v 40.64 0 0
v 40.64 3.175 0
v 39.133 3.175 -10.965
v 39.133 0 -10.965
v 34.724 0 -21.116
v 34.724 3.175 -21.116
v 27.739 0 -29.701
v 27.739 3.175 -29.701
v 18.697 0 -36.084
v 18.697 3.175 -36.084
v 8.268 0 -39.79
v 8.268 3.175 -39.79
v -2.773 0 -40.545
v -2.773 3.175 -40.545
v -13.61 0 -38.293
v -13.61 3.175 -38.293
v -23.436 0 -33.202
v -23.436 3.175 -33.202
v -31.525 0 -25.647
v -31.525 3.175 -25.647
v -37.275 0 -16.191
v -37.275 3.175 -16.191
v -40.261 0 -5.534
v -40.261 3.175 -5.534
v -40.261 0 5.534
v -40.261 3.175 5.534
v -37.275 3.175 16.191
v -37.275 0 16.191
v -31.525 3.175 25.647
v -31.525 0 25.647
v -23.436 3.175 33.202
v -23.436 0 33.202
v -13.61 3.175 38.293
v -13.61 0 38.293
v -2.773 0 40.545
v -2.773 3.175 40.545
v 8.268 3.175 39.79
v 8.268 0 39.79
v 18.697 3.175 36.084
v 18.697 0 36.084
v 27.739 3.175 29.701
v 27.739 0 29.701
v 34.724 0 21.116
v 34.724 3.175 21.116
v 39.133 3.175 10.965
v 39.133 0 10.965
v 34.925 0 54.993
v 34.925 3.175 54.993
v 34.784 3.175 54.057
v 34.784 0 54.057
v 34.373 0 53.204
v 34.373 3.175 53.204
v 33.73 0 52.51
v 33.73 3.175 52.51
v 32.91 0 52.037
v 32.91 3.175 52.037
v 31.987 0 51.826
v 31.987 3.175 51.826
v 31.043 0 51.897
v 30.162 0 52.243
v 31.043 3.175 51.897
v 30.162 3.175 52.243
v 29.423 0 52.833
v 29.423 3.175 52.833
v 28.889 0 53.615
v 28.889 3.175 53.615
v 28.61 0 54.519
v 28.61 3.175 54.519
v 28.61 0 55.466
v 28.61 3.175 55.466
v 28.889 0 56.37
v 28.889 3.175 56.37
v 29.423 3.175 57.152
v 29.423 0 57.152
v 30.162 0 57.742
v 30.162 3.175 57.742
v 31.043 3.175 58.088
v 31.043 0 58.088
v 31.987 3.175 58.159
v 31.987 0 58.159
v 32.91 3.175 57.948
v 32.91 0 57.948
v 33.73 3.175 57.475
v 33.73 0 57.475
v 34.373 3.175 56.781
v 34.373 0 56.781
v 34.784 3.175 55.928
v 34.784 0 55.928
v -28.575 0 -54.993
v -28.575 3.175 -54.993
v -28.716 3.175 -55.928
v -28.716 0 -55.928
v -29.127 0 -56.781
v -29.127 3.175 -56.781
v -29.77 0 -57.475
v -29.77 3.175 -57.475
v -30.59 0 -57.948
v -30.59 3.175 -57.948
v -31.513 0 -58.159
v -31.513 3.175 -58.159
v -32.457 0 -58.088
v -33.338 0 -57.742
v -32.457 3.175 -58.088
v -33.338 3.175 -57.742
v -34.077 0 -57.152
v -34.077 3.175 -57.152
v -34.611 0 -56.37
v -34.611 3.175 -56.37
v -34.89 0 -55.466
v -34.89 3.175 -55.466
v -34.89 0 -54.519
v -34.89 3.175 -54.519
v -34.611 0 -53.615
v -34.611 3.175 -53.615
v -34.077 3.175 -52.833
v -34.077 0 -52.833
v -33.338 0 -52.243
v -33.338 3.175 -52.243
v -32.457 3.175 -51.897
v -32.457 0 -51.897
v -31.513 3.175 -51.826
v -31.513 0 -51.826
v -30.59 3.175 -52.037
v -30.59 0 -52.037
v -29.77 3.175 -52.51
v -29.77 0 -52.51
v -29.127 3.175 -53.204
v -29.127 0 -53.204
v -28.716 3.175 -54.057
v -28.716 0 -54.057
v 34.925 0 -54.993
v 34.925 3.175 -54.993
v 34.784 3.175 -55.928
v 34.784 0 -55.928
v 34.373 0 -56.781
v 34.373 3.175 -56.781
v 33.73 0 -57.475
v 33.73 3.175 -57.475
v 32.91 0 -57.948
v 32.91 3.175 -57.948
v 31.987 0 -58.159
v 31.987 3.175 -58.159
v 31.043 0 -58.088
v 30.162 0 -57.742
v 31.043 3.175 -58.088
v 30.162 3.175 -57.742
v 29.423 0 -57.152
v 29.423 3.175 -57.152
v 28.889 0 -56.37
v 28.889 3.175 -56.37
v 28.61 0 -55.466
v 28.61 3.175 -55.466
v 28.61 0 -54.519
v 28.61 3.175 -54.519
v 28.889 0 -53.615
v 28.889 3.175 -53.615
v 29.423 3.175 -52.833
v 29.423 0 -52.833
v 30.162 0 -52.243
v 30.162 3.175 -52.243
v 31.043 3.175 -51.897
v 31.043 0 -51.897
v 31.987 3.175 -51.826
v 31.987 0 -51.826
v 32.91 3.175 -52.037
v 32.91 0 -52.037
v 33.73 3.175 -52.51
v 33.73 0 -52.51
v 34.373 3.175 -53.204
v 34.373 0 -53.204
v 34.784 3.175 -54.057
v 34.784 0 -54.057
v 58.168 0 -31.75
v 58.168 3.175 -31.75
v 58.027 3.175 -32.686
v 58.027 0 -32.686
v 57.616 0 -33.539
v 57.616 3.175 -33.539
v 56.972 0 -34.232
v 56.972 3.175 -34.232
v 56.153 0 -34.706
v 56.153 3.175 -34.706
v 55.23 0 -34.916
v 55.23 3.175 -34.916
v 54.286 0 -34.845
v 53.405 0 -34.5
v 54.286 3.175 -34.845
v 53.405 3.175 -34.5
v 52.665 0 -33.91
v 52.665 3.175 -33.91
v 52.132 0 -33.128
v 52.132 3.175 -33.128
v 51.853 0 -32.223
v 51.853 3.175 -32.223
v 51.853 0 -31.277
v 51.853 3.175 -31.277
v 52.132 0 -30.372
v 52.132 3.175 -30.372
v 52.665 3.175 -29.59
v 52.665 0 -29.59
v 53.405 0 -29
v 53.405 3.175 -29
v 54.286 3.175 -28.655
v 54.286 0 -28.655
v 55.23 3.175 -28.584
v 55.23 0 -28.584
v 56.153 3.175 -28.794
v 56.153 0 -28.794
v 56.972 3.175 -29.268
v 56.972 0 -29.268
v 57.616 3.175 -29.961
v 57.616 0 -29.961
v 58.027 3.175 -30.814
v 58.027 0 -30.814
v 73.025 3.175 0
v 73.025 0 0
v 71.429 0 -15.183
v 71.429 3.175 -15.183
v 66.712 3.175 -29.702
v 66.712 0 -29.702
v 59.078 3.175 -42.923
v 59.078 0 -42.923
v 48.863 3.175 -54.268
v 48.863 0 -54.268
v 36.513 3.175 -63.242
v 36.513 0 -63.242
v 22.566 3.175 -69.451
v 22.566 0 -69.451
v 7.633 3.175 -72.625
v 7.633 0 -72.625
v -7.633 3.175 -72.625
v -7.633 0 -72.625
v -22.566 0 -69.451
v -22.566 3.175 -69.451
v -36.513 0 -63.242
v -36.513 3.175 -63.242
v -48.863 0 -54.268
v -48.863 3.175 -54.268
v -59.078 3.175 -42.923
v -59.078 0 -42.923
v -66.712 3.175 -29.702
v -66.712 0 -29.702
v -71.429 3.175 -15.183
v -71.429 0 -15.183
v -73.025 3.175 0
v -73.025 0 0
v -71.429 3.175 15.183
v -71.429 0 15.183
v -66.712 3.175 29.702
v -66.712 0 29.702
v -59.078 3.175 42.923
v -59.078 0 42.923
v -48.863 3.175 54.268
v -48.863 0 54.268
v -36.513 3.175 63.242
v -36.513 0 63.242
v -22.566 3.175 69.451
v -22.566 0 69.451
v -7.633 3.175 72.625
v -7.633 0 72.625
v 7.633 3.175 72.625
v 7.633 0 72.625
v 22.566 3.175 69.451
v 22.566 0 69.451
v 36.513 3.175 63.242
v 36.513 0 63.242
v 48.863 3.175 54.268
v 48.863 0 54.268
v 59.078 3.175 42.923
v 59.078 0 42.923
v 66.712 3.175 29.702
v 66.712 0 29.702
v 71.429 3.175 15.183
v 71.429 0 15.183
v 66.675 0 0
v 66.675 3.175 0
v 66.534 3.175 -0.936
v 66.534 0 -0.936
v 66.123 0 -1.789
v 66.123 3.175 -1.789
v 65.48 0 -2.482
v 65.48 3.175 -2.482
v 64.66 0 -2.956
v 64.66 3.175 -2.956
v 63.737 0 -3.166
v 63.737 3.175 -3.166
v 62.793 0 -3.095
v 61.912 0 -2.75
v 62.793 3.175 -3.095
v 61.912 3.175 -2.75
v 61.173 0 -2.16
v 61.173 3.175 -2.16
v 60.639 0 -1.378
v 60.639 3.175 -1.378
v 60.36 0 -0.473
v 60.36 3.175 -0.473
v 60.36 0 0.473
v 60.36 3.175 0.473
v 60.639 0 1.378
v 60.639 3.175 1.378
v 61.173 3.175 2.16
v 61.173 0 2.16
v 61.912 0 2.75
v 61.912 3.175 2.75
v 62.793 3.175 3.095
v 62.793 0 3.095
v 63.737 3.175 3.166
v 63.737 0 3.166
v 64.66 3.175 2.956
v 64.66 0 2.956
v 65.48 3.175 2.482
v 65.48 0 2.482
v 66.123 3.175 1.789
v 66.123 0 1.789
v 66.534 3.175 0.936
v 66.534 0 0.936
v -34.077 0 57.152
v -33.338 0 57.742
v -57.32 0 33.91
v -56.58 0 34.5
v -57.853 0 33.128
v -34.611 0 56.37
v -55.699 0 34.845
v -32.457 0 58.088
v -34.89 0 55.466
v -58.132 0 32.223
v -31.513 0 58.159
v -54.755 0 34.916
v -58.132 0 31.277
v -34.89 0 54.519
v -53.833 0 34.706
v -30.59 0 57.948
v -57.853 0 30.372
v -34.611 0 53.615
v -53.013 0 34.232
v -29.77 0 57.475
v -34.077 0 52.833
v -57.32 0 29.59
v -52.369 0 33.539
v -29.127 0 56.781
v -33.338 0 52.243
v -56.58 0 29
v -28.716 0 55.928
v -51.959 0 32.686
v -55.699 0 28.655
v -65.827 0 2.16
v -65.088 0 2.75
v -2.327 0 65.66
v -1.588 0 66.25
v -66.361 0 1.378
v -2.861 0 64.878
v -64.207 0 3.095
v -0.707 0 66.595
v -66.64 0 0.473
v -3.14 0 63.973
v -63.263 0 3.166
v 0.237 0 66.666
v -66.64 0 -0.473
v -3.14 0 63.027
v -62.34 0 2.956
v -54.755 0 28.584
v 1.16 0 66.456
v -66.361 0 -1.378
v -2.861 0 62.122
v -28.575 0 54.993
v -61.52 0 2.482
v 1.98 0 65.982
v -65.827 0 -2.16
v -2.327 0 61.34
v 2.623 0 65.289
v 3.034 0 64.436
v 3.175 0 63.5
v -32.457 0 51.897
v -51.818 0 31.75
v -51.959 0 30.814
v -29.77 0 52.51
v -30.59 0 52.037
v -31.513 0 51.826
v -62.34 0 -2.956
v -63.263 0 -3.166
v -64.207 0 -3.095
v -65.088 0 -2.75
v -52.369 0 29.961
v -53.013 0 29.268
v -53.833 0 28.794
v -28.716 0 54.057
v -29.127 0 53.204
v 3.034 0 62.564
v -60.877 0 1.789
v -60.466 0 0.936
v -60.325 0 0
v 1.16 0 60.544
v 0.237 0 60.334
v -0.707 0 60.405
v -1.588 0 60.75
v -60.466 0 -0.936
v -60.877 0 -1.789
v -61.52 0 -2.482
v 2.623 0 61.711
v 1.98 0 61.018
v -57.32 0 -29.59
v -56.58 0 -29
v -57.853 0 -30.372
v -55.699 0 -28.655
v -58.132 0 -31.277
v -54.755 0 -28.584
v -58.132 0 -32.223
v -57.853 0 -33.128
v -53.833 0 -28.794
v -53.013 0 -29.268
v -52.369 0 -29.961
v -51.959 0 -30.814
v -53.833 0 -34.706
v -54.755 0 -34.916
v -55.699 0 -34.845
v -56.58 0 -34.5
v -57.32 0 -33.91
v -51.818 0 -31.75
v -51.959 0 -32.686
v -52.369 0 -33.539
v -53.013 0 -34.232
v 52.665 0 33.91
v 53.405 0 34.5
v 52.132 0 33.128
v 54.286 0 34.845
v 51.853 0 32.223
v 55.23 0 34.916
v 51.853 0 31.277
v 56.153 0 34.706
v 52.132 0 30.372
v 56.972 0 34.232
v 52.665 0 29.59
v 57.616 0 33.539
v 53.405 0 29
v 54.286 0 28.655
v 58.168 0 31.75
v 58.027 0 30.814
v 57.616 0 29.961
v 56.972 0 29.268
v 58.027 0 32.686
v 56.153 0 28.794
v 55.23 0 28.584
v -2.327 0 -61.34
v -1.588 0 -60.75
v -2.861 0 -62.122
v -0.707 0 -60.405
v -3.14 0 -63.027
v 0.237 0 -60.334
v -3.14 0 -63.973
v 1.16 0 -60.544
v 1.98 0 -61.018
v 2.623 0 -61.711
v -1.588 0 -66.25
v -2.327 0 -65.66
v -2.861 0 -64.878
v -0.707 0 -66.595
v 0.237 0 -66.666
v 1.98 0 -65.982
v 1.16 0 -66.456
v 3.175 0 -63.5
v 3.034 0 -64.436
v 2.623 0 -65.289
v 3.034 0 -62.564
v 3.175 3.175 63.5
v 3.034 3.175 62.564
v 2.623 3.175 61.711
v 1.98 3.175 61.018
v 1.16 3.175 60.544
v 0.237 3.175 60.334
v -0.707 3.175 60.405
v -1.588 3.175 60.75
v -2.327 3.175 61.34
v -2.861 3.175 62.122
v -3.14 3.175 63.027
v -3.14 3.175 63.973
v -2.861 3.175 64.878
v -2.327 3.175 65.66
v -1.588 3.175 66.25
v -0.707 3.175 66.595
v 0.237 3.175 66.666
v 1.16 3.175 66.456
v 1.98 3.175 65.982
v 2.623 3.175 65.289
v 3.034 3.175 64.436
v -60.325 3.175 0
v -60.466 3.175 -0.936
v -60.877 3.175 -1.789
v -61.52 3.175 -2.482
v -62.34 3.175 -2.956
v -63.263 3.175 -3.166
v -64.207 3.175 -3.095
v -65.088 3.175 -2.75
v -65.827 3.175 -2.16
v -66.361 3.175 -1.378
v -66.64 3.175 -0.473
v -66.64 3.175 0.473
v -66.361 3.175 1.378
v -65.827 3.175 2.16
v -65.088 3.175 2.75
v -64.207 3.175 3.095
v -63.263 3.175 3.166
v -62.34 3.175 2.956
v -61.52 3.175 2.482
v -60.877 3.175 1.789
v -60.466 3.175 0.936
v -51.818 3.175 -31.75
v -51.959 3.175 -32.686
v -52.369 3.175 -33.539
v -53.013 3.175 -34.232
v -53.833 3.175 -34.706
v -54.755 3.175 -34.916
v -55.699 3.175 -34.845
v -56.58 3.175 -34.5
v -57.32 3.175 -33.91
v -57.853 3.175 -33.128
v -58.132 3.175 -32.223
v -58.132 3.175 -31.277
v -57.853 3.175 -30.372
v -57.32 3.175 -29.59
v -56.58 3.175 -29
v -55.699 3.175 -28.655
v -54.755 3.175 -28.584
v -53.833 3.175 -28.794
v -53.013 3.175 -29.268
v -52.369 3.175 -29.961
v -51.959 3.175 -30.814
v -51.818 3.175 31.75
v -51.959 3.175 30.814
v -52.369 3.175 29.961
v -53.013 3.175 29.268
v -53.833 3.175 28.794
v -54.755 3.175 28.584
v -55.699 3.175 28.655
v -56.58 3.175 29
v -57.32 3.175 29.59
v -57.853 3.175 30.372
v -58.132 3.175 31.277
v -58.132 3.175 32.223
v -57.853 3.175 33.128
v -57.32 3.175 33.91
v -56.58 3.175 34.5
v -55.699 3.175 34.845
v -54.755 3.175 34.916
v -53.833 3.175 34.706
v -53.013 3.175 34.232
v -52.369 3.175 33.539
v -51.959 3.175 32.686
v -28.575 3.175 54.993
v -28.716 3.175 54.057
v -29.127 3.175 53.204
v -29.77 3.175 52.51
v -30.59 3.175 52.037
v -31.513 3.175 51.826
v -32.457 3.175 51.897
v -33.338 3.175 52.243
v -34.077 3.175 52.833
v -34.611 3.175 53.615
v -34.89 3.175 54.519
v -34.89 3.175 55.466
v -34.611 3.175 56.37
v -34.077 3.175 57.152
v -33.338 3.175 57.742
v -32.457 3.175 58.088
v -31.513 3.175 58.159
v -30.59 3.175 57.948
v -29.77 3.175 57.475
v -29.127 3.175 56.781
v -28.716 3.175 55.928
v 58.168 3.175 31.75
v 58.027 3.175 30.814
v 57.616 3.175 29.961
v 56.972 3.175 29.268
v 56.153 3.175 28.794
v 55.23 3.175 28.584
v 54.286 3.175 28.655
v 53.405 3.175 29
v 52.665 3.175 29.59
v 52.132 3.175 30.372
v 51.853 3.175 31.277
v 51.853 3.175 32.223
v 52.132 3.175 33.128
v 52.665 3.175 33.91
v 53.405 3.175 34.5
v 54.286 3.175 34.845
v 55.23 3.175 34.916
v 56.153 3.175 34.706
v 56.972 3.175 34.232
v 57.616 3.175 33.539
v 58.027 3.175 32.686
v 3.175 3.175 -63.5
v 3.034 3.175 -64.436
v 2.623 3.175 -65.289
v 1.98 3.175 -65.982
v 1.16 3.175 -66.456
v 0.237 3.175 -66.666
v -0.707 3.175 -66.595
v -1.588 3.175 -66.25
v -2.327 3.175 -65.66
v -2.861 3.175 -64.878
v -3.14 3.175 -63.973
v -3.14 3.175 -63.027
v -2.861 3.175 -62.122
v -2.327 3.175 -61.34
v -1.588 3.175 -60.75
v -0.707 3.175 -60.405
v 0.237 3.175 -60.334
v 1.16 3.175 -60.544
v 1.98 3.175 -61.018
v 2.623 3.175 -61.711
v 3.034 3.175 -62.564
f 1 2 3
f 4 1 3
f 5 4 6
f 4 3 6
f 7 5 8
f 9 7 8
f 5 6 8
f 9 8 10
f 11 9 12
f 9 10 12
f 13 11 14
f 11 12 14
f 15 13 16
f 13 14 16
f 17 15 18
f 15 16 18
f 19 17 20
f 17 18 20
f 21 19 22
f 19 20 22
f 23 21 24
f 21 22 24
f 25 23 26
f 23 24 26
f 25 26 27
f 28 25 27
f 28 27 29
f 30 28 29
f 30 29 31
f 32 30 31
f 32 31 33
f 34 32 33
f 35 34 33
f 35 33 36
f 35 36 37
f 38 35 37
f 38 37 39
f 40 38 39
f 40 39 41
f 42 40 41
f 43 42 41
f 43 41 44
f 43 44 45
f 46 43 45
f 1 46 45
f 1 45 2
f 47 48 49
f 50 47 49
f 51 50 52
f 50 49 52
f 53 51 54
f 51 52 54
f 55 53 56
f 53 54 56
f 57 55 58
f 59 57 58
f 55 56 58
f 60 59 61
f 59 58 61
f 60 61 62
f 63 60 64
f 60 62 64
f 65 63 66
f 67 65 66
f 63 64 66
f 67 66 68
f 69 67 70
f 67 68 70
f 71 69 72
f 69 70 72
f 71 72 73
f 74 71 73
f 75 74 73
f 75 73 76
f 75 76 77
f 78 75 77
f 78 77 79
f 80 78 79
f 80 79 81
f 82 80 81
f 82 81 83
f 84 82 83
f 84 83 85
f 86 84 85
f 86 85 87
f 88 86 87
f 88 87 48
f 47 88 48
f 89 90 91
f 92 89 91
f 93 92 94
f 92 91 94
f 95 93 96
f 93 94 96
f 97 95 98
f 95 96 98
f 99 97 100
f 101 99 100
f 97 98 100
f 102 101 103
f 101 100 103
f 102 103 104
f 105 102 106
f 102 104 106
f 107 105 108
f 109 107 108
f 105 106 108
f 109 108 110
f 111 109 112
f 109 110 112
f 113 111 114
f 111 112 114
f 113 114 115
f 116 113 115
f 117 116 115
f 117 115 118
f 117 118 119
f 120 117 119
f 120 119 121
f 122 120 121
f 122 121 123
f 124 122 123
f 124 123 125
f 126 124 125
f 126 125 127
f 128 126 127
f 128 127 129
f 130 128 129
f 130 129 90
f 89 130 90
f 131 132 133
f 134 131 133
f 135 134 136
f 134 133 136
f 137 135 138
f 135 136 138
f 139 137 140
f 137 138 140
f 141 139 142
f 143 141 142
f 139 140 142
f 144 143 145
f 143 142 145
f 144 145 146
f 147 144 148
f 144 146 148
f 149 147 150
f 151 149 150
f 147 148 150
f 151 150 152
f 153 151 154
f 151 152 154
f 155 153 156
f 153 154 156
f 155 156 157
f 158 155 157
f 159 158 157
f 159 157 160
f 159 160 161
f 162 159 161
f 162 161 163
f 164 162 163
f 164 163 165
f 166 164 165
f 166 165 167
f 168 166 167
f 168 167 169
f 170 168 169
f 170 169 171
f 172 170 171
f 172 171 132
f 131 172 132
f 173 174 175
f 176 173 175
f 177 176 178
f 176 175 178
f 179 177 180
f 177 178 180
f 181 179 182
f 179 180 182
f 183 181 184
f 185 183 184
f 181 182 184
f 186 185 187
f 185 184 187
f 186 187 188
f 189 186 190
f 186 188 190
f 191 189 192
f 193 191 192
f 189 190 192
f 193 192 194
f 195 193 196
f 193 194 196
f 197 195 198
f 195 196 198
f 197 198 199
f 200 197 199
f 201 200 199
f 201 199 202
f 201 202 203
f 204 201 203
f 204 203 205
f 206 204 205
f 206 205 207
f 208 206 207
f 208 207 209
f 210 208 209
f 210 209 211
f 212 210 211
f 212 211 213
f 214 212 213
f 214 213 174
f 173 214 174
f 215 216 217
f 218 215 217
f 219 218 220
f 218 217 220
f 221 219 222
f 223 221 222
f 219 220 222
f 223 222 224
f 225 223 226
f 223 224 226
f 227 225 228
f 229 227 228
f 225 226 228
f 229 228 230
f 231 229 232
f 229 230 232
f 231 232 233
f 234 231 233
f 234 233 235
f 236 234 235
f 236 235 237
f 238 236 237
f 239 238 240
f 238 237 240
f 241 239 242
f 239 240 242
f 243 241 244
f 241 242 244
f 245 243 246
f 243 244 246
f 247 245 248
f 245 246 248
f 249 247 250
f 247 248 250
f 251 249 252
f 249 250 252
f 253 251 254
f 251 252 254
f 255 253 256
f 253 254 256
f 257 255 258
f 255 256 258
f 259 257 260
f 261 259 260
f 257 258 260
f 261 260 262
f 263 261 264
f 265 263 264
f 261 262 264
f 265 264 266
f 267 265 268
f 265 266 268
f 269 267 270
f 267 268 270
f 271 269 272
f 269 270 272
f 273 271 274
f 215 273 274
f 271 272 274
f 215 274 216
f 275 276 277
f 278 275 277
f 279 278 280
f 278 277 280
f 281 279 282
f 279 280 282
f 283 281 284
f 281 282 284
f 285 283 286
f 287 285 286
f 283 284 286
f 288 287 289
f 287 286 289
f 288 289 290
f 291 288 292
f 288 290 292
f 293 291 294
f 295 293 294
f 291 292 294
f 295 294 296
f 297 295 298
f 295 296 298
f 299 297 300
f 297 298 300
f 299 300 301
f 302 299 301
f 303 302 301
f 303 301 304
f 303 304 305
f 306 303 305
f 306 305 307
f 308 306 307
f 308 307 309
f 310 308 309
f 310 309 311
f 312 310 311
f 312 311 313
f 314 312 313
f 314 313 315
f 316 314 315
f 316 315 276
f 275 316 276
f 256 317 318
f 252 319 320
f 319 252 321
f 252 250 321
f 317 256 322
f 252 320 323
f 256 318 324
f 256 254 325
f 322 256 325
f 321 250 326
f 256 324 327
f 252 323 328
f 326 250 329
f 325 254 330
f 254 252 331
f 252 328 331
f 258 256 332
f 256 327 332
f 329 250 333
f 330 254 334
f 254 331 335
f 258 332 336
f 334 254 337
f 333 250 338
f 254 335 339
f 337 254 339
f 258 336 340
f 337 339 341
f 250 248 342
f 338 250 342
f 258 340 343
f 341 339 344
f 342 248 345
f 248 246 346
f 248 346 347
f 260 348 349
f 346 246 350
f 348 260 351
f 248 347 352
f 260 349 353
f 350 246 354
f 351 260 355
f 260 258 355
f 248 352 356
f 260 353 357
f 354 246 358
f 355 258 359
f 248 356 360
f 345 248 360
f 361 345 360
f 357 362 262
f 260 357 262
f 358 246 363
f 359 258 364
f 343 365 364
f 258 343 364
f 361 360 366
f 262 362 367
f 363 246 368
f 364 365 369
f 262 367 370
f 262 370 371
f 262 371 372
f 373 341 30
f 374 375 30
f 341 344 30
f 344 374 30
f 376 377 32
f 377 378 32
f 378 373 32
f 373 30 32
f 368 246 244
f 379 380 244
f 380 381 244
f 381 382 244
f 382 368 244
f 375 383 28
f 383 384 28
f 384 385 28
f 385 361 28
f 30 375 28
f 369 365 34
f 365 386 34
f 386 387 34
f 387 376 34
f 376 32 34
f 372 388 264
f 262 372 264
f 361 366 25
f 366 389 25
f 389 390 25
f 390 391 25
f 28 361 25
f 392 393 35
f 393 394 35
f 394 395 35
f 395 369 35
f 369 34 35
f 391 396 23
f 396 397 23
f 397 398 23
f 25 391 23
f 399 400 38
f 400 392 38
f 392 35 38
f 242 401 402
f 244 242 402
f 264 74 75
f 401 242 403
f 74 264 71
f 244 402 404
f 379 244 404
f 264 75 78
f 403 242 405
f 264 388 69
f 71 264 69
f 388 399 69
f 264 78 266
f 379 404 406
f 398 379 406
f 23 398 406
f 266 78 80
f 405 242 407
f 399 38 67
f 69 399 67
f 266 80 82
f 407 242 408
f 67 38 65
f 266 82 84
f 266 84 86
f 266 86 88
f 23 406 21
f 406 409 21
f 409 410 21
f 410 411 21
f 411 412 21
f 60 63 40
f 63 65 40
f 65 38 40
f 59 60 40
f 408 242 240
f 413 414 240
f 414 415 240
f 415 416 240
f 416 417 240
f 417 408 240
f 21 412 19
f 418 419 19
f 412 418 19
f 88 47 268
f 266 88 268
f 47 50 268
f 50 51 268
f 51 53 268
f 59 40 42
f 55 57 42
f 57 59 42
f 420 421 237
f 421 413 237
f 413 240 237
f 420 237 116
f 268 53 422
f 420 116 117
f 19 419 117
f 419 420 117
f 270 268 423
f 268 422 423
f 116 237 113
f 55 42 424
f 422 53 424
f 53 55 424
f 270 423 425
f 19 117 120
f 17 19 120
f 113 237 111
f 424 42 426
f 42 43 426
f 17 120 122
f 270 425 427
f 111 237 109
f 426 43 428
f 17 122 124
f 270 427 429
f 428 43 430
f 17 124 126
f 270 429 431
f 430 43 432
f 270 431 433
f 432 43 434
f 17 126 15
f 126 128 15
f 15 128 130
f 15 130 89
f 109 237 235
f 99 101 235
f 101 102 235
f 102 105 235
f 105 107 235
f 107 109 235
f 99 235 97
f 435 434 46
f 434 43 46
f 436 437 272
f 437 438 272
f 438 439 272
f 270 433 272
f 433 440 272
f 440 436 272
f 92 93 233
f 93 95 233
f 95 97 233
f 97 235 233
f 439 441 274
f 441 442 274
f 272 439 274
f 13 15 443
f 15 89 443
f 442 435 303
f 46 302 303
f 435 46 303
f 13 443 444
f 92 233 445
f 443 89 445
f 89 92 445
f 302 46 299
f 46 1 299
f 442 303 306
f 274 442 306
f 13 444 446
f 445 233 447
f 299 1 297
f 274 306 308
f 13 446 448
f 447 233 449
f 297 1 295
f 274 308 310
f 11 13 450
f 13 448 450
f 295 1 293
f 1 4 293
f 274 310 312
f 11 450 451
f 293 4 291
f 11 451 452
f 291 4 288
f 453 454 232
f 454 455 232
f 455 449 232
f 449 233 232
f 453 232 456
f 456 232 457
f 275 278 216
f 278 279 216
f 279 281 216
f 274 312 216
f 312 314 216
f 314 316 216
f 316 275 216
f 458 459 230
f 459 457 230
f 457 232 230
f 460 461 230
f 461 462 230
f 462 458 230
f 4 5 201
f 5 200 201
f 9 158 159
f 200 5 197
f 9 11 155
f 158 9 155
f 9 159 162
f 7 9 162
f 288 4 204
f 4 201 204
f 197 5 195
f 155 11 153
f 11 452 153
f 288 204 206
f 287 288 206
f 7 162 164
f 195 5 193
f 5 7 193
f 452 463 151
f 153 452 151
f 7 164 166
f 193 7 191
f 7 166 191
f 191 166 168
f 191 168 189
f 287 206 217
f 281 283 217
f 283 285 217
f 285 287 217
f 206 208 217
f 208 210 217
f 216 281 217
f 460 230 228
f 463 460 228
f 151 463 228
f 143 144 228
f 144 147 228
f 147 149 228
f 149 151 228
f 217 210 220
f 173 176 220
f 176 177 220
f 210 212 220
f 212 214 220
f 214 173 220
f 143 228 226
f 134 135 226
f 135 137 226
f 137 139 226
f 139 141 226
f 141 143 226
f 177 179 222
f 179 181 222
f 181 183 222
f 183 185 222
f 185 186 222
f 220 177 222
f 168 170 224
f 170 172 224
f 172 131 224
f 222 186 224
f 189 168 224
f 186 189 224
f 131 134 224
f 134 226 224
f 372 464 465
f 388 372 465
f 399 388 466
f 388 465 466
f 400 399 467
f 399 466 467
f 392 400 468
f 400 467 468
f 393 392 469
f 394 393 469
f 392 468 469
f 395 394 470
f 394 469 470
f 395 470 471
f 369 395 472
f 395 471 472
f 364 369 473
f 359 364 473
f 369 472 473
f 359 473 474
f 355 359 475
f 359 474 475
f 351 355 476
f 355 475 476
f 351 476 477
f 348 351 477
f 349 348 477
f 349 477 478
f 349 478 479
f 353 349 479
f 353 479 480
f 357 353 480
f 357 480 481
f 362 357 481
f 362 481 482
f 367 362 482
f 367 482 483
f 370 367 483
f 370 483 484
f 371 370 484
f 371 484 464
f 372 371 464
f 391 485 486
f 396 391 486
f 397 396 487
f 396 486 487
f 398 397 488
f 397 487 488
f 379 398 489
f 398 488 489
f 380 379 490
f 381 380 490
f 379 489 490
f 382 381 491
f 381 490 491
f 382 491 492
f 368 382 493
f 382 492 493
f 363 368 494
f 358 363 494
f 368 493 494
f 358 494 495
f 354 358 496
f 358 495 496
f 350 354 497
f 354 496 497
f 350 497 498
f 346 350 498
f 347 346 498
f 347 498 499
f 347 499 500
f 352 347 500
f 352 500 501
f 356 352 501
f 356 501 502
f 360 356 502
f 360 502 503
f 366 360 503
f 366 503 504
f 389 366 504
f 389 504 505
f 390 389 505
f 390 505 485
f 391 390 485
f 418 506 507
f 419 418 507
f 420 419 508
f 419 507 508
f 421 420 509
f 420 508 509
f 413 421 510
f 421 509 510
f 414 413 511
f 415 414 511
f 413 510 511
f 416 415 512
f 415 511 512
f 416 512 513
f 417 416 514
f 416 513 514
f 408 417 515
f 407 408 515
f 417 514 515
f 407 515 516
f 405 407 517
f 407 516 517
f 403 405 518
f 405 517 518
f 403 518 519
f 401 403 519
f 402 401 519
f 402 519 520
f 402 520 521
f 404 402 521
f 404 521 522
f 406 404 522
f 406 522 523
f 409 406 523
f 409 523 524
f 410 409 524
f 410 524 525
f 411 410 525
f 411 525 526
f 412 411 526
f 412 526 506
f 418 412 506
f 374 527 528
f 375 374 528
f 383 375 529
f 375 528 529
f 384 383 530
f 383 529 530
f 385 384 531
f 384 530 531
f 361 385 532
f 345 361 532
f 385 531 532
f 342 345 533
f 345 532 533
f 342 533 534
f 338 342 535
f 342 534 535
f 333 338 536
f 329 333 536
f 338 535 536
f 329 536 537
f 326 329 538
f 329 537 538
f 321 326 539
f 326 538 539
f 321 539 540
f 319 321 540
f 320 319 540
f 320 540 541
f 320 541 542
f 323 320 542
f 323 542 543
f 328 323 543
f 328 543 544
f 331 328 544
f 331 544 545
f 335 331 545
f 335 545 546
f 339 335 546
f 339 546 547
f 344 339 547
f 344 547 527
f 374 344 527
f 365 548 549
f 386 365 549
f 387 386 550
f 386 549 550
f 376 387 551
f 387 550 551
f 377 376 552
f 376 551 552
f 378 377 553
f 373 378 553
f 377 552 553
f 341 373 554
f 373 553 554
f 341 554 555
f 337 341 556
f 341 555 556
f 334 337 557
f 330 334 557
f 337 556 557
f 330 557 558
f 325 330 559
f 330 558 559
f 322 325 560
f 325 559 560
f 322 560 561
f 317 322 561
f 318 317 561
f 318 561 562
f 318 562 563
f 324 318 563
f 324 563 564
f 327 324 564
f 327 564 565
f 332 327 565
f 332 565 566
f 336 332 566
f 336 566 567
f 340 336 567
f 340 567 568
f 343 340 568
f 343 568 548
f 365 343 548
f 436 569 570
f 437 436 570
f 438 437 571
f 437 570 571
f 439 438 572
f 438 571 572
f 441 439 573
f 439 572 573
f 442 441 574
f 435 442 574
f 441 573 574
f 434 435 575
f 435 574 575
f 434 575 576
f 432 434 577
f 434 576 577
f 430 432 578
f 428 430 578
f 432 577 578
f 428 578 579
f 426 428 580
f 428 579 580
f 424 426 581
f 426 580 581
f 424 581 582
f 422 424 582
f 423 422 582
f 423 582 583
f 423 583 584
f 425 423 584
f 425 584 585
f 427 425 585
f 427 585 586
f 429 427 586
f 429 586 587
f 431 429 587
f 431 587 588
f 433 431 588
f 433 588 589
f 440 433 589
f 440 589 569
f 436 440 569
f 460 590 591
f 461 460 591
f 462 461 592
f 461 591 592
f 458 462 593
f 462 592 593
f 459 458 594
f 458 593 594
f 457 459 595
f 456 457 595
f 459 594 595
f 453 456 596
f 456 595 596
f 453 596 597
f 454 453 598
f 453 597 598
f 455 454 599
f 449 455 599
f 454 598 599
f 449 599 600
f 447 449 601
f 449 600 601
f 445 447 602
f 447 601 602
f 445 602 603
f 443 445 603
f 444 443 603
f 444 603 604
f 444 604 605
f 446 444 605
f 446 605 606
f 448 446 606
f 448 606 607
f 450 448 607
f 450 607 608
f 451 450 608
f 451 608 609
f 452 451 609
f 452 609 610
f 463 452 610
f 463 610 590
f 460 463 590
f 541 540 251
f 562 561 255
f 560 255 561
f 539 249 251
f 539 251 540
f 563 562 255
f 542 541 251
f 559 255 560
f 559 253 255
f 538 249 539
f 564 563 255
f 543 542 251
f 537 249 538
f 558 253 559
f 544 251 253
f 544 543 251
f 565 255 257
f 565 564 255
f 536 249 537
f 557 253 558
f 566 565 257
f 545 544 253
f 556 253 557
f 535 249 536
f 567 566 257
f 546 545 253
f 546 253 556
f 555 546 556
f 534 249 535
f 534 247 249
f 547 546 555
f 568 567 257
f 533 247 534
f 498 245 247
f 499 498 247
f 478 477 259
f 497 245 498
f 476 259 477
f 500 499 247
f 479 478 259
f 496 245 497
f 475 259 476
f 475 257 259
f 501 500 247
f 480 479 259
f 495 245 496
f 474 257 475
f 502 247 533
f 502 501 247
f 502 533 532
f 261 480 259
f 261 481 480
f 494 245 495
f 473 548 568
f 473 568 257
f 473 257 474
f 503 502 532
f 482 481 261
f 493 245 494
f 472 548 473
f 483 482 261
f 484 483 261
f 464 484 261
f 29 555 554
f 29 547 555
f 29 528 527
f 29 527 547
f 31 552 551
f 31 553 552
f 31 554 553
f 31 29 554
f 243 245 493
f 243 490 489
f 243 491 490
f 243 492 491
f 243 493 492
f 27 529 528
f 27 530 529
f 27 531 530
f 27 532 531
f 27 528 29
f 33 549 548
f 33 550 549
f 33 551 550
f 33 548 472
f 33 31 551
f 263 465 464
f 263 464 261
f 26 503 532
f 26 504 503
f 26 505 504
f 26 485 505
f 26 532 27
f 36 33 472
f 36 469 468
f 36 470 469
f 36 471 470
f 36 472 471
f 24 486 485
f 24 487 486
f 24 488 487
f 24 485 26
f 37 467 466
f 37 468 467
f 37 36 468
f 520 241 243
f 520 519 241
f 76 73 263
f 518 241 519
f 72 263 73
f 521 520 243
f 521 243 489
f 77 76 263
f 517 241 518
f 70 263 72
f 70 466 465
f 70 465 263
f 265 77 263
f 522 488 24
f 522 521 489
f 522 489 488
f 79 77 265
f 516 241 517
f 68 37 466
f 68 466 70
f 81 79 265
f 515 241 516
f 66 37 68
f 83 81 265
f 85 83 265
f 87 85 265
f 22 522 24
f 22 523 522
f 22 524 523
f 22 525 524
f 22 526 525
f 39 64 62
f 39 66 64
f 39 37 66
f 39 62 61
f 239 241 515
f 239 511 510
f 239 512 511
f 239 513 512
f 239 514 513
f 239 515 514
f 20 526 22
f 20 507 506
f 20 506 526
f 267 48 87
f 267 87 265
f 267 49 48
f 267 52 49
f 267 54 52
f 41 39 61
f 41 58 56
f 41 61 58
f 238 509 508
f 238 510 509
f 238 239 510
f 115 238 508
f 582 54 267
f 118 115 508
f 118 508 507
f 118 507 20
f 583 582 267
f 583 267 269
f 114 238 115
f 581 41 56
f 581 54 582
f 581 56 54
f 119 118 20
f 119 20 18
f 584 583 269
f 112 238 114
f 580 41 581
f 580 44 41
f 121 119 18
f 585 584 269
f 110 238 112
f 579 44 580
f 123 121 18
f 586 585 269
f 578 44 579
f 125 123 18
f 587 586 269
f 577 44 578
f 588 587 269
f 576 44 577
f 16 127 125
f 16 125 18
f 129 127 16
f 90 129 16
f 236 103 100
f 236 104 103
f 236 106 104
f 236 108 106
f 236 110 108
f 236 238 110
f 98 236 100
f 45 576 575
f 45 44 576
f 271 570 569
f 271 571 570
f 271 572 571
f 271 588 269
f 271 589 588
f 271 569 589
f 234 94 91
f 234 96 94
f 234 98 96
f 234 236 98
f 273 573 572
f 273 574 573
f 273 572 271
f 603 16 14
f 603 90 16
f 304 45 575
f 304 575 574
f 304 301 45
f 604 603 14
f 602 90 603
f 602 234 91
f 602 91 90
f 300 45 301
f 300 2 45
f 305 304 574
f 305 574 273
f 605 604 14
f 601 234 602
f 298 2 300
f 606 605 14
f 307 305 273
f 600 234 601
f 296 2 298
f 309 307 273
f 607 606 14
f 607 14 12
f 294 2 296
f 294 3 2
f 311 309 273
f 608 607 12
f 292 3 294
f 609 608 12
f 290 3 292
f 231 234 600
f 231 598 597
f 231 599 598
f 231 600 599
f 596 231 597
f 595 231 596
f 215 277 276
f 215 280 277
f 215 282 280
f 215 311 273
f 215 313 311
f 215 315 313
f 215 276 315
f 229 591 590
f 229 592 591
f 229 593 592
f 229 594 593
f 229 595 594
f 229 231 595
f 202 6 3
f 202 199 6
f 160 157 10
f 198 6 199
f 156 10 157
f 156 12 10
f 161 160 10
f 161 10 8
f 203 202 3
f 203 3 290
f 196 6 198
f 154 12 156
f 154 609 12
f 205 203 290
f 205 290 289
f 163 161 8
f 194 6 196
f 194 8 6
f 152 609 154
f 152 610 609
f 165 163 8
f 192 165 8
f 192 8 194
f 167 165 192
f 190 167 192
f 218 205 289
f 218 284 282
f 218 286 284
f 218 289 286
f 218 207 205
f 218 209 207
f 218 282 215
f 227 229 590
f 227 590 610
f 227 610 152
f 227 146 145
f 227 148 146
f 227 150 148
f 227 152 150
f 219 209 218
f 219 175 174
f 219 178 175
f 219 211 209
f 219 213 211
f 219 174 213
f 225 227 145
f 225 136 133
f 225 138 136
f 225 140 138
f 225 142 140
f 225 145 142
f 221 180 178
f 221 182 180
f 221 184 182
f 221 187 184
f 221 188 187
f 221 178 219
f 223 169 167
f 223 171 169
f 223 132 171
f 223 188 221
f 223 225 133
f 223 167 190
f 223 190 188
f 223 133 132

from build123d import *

# Parameters (mm, degrees)
SKETCH1_R           = 73.025
BOSS_EXTRUDE1_DEPTH = 3.175
SKETCH2_R           = 3.175
CUT_EXTRUDE1_DEPTH  = 4.175
SKETCH3_R           = 40.64
CUT_EXTRUDE2_DEPTH  = 4.175


with BuildPart() as part:
    # Sketch1 → Boss-Extrude1 (new body)
    with BuildSketch(Plane(origin=(0, 0, 0), x_dir=(1, 0, 0), z_dir=(0, 1, 0))):
        Circle(SKETCH1_R)
    extrude(amount=BOSS_EXTRUDE1_DEPTH)

    # Sketch2 → Cut-Extrude1 (cut, through all)
    with BuildSketch(Plane(origin=(0, 3.175, 0), x_dir=(1, 0, 0), z_dir=(0, 1, 0))):
        with Locations((63.5, 0)):
            Circle(SKETCH2_R)
        with Locations((54.99261314, -31.75)):
            Circle(SKETCH2_R)
        with Locations((31.75, -54.99261314)):
            Circle(SKETCH2_R)
        with Locations((0, -63.5)):
            Circle(SKETCH2_R)
        with Locations((-31.75, -54.99261314)):
            Circle(SKETCH2_R)
        with Locations((-54.99261314, -31.75)):
            Circle(SKETCH2_R)
        with Locations((-63.5, 0)):
            Circle(SKETCH2_R)
        with Locations((-54.99261314, 31.75)):
            Circle(SKETCH2_R)
        with Locations((-31.75, 54.99261314)):
            Circle(SKETCH2_R)
        with Locations((0, 63.5)):
            Circle(SKETCH2_R)
        with Locations((31.75, 54.99261314)):
            Circle(SKETCH2_R)
        with Locations((54.99261314, 31.75)):
            Circle(SKETCH2_R)
    extrude(amount=-CUT_EXTRUDE1_DEPTH, mode=Mode.SUBTRACT)

    # Sketch3 → Cut-Extrude2 (cut, through all)
    with BuildSketch(Plane(origin=(0, 3.175, 0), x_dir=(1, 0, 0), z_dir=(0, 1, 0))):
        Circle(SKETCH3_R)
    extrude(amount=-CUT_EXTRUDE2_DEPTH, mode=Mode.SUBTRACT)


solid = part.part
